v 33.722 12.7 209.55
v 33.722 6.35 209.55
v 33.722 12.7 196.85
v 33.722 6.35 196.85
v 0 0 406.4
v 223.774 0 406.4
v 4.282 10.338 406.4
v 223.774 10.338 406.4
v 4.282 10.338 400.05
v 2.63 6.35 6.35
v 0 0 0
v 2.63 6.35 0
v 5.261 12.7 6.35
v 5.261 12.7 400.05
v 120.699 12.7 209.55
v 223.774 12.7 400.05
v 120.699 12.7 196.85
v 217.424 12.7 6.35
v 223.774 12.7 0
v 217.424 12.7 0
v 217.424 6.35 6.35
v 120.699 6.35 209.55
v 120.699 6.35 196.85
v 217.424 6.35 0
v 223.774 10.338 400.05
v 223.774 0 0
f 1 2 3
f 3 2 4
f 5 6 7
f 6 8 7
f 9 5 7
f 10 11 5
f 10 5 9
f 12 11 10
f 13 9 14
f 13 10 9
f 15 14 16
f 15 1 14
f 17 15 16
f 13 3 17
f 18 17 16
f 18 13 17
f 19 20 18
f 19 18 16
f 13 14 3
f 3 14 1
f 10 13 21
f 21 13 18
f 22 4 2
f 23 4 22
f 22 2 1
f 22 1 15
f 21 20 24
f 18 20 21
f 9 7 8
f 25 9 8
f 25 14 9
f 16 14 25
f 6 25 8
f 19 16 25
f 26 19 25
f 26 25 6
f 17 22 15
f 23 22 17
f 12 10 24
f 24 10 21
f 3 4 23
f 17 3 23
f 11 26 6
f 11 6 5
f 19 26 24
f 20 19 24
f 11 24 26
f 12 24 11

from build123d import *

# Parameters (mm, degrees)
BOSS_EXTRUDE1_DEPTH = 406.4
SKETCH2_W           = 239.802769694
SKETCH2_H           = 6.35
CUT_EXTRUDE1_DEPTH  = 6.35
SKETCH3_W           = 223.774
SKETCH3_H           = 6.35
CUT_EXTRUDE2_DEPTH  = 2.3622
CAVITY1_START       = 6.35
CAVITY1_OUTLINE_W   = 86.976200951
CAVITY1_OUTLINE_H   = 12.7
CAVITY1_DEPTH       = 6.35


# Read off the part's stored shape, not the designer's step: Cavity1
with BuildPart() as part:
    # Sketch1 → Boss-Extrude1 (new body)
    with BuildSketch(Plane.XY):
        Polygon((0, 0), (5.260512242, 12.7), (223.774, 12.7), (223.774, 0), align=None)
    extrude(amount=BOSS_EXTRUDE1_DEPTH)

    # Sketch2 → Cut-Extrude1 (cut)
    with BuildSketch(Plane.XZ.offset(-12.7)):
        with Locations((97.522615153, 3.175)):
            Rectangle(SKETCH2_W, SKETCH2_H)
    extrude(amount=CUT_EXTRUDE1_DEPTH, mode=Mode.SUBTRACT)

    # Sketch3 → Cut-Extrude2 (cut)
    with BuildSketch(Plane.XZ.offset(-12.7)):
        with Locations((111.887, 403.225)):
            Rectangle(SKETCH3_W, SKETCH3_H)
    extrude(amount=CUT_EXTRUDE2_DEPTH, mode=Mode.SUBTRACT)

    # Cavity1 outline → Cavity1 (cut)
    with BuildSketch(Plane(origin=(0, 0, 0), x_dir=(1, 0, 0), z_dir=(0, 1, 0)).offset(CAVITY1_START)):
        with Locations((77.210447741, -203.2)):
            Rectangle(CAVITY1_OUTLINE_W, CAVITY1_OUTLINE_H)
    extrude(amount=CAVITY1_DEPTH, mode=Mode.SUBTRACT)


solid = part.part
